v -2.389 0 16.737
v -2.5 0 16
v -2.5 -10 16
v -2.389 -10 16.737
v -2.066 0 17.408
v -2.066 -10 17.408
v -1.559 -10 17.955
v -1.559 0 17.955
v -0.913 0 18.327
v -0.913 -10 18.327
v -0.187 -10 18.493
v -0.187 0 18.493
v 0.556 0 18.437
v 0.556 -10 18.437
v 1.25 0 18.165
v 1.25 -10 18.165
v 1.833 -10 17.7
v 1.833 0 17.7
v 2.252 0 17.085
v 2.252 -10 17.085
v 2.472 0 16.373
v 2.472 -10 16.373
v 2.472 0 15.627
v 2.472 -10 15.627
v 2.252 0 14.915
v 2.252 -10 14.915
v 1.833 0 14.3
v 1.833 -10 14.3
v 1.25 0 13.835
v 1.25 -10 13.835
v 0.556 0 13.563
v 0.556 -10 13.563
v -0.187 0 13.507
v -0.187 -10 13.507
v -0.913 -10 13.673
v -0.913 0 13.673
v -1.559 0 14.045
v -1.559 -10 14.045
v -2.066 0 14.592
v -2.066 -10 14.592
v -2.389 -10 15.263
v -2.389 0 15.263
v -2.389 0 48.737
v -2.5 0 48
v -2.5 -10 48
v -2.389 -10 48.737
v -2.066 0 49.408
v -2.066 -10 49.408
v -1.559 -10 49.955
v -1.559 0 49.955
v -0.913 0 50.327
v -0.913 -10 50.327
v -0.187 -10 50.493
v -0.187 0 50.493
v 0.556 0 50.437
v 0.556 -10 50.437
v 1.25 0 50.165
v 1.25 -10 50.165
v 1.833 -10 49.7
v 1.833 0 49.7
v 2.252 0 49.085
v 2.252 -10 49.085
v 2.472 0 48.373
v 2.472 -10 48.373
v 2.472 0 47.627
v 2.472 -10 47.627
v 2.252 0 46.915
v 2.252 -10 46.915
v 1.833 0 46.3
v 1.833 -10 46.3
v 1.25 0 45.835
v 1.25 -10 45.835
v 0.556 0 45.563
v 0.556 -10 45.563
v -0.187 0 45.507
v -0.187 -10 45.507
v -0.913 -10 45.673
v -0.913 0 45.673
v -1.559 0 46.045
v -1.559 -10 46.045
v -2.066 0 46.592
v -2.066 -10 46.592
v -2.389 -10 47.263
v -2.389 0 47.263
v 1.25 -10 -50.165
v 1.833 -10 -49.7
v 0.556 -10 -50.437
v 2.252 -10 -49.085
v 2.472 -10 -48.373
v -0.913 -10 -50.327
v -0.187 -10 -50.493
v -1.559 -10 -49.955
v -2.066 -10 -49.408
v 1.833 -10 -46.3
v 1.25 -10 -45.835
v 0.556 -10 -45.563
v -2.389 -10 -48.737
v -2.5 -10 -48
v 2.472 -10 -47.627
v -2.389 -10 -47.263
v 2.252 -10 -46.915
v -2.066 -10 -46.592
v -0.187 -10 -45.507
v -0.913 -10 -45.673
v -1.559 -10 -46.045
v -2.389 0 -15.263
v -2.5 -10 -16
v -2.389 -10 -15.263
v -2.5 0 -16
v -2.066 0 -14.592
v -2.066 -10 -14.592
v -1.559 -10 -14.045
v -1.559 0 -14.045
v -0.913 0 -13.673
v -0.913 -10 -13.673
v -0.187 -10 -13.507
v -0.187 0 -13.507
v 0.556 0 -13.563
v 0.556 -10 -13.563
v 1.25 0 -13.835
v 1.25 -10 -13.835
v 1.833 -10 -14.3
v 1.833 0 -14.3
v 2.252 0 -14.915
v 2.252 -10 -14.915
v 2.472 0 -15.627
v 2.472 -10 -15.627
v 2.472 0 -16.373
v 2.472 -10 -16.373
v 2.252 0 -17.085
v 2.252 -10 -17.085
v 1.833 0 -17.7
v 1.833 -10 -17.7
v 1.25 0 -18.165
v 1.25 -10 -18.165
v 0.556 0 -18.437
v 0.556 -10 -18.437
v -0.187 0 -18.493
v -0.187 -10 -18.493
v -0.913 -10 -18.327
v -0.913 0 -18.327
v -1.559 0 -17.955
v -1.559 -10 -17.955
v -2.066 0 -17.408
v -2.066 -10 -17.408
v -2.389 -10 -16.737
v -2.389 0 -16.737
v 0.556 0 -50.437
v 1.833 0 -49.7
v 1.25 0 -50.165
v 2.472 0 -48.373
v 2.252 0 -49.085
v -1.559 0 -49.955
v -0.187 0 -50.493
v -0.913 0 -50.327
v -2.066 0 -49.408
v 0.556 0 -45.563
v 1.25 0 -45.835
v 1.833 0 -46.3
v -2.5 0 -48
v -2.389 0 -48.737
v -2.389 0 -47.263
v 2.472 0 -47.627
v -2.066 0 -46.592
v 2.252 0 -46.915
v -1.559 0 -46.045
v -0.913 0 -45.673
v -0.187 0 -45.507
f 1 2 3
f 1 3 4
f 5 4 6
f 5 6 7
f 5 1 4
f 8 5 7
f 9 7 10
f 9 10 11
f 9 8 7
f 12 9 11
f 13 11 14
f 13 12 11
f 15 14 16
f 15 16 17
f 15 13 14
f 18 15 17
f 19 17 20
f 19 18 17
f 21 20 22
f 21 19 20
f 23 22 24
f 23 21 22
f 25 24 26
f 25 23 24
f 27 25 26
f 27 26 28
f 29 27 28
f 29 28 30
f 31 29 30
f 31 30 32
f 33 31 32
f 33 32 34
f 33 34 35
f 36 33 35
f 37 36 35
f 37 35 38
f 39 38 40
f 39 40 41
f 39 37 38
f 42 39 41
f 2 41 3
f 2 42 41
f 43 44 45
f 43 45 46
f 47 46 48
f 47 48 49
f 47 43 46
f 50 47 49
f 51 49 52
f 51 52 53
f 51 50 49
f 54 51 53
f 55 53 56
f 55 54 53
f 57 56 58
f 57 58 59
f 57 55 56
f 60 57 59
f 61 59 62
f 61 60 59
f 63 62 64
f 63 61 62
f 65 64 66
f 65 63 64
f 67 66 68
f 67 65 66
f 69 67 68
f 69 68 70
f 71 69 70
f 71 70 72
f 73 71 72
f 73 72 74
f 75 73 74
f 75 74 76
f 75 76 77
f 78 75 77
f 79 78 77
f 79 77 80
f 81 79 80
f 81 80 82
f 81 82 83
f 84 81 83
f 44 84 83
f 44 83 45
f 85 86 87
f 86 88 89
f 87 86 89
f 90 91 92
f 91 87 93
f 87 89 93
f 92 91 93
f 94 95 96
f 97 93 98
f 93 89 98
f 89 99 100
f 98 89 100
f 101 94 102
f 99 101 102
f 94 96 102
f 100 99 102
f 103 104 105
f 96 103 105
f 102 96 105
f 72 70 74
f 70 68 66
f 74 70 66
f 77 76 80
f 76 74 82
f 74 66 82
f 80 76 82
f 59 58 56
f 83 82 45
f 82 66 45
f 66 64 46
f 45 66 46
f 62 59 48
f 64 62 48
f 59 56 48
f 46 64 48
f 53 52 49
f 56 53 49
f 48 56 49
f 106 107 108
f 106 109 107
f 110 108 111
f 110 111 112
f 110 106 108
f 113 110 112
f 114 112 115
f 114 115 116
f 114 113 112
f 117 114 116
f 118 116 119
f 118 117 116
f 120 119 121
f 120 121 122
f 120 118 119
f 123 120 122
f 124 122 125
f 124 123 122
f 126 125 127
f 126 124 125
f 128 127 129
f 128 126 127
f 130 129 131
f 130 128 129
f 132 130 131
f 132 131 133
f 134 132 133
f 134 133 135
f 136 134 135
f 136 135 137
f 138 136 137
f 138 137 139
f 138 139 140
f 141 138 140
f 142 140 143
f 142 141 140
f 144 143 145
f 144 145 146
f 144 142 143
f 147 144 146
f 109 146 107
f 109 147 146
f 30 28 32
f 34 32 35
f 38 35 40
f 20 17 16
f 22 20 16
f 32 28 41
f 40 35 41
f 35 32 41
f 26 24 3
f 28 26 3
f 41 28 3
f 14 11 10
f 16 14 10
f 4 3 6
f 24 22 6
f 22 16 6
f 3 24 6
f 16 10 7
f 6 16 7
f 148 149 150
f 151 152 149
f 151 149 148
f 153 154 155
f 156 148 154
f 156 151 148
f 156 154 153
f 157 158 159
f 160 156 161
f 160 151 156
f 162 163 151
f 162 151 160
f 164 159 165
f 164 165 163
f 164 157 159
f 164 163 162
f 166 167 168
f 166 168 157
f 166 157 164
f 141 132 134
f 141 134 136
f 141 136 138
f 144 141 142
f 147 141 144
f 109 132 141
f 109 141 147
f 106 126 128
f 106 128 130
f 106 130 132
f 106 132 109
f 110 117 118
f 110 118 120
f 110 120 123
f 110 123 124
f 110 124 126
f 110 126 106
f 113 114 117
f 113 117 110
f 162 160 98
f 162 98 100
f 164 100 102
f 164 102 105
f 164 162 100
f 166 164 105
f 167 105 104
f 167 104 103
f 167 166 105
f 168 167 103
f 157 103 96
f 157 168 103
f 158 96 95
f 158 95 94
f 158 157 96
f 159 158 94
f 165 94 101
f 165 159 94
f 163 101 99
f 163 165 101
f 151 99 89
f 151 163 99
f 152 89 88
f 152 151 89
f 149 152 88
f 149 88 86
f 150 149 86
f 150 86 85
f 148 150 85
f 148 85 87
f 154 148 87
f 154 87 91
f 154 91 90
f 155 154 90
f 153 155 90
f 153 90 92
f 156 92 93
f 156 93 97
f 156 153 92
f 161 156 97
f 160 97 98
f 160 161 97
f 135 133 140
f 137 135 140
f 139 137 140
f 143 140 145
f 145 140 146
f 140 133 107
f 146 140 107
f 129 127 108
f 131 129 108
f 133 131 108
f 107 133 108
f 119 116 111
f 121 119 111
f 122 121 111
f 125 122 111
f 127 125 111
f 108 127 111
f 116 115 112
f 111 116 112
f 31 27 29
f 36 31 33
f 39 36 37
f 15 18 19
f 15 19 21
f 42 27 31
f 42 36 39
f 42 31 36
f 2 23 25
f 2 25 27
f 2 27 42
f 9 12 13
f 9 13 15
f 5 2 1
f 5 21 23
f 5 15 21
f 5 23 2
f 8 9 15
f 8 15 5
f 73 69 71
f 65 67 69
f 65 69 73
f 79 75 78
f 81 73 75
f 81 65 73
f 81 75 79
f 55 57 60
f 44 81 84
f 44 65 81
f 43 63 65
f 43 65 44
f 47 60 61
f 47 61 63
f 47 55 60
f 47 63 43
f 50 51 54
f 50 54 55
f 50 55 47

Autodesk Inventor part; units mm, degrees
ref_plane "YZ Plane" through (0, 0, 0) normal (1, 0, 0) x (0, 1, 0)
ref_plane "XZ Plane" through (0, 0, 0) normal (0, 1, 0) x (-1, 0, 0)
ref_plane "XY Plane" through (0, 0, 0) normal (0, 0, 1) x (1, 0, 0)
sketch "Sketch1" plane through (0, 0, 0) normal (0, 1, 0) x (-1, 0, 0)
  circle A0 centre (0, 48) radius 2.5
  circle A1 centre (0, 16) radius 2.5
  circle A2 centre (0, -16) radius 2.5
  circle A3 centre (0, -48) radius 2.5
  point P0 (0, 0)
  dimension "d0" = 5
  dimension "d1" = 5
  dimension "d2" = 5
  dimension "d3" = 5
  dimension "d4" = 32
  dimension "d5" = 32
  dimension "d6" = 32
  dimension "d7" = 16
extrude "Extrusion1" add sketch "Sketch1" against normal blind 10
properties part number "front_holes"
